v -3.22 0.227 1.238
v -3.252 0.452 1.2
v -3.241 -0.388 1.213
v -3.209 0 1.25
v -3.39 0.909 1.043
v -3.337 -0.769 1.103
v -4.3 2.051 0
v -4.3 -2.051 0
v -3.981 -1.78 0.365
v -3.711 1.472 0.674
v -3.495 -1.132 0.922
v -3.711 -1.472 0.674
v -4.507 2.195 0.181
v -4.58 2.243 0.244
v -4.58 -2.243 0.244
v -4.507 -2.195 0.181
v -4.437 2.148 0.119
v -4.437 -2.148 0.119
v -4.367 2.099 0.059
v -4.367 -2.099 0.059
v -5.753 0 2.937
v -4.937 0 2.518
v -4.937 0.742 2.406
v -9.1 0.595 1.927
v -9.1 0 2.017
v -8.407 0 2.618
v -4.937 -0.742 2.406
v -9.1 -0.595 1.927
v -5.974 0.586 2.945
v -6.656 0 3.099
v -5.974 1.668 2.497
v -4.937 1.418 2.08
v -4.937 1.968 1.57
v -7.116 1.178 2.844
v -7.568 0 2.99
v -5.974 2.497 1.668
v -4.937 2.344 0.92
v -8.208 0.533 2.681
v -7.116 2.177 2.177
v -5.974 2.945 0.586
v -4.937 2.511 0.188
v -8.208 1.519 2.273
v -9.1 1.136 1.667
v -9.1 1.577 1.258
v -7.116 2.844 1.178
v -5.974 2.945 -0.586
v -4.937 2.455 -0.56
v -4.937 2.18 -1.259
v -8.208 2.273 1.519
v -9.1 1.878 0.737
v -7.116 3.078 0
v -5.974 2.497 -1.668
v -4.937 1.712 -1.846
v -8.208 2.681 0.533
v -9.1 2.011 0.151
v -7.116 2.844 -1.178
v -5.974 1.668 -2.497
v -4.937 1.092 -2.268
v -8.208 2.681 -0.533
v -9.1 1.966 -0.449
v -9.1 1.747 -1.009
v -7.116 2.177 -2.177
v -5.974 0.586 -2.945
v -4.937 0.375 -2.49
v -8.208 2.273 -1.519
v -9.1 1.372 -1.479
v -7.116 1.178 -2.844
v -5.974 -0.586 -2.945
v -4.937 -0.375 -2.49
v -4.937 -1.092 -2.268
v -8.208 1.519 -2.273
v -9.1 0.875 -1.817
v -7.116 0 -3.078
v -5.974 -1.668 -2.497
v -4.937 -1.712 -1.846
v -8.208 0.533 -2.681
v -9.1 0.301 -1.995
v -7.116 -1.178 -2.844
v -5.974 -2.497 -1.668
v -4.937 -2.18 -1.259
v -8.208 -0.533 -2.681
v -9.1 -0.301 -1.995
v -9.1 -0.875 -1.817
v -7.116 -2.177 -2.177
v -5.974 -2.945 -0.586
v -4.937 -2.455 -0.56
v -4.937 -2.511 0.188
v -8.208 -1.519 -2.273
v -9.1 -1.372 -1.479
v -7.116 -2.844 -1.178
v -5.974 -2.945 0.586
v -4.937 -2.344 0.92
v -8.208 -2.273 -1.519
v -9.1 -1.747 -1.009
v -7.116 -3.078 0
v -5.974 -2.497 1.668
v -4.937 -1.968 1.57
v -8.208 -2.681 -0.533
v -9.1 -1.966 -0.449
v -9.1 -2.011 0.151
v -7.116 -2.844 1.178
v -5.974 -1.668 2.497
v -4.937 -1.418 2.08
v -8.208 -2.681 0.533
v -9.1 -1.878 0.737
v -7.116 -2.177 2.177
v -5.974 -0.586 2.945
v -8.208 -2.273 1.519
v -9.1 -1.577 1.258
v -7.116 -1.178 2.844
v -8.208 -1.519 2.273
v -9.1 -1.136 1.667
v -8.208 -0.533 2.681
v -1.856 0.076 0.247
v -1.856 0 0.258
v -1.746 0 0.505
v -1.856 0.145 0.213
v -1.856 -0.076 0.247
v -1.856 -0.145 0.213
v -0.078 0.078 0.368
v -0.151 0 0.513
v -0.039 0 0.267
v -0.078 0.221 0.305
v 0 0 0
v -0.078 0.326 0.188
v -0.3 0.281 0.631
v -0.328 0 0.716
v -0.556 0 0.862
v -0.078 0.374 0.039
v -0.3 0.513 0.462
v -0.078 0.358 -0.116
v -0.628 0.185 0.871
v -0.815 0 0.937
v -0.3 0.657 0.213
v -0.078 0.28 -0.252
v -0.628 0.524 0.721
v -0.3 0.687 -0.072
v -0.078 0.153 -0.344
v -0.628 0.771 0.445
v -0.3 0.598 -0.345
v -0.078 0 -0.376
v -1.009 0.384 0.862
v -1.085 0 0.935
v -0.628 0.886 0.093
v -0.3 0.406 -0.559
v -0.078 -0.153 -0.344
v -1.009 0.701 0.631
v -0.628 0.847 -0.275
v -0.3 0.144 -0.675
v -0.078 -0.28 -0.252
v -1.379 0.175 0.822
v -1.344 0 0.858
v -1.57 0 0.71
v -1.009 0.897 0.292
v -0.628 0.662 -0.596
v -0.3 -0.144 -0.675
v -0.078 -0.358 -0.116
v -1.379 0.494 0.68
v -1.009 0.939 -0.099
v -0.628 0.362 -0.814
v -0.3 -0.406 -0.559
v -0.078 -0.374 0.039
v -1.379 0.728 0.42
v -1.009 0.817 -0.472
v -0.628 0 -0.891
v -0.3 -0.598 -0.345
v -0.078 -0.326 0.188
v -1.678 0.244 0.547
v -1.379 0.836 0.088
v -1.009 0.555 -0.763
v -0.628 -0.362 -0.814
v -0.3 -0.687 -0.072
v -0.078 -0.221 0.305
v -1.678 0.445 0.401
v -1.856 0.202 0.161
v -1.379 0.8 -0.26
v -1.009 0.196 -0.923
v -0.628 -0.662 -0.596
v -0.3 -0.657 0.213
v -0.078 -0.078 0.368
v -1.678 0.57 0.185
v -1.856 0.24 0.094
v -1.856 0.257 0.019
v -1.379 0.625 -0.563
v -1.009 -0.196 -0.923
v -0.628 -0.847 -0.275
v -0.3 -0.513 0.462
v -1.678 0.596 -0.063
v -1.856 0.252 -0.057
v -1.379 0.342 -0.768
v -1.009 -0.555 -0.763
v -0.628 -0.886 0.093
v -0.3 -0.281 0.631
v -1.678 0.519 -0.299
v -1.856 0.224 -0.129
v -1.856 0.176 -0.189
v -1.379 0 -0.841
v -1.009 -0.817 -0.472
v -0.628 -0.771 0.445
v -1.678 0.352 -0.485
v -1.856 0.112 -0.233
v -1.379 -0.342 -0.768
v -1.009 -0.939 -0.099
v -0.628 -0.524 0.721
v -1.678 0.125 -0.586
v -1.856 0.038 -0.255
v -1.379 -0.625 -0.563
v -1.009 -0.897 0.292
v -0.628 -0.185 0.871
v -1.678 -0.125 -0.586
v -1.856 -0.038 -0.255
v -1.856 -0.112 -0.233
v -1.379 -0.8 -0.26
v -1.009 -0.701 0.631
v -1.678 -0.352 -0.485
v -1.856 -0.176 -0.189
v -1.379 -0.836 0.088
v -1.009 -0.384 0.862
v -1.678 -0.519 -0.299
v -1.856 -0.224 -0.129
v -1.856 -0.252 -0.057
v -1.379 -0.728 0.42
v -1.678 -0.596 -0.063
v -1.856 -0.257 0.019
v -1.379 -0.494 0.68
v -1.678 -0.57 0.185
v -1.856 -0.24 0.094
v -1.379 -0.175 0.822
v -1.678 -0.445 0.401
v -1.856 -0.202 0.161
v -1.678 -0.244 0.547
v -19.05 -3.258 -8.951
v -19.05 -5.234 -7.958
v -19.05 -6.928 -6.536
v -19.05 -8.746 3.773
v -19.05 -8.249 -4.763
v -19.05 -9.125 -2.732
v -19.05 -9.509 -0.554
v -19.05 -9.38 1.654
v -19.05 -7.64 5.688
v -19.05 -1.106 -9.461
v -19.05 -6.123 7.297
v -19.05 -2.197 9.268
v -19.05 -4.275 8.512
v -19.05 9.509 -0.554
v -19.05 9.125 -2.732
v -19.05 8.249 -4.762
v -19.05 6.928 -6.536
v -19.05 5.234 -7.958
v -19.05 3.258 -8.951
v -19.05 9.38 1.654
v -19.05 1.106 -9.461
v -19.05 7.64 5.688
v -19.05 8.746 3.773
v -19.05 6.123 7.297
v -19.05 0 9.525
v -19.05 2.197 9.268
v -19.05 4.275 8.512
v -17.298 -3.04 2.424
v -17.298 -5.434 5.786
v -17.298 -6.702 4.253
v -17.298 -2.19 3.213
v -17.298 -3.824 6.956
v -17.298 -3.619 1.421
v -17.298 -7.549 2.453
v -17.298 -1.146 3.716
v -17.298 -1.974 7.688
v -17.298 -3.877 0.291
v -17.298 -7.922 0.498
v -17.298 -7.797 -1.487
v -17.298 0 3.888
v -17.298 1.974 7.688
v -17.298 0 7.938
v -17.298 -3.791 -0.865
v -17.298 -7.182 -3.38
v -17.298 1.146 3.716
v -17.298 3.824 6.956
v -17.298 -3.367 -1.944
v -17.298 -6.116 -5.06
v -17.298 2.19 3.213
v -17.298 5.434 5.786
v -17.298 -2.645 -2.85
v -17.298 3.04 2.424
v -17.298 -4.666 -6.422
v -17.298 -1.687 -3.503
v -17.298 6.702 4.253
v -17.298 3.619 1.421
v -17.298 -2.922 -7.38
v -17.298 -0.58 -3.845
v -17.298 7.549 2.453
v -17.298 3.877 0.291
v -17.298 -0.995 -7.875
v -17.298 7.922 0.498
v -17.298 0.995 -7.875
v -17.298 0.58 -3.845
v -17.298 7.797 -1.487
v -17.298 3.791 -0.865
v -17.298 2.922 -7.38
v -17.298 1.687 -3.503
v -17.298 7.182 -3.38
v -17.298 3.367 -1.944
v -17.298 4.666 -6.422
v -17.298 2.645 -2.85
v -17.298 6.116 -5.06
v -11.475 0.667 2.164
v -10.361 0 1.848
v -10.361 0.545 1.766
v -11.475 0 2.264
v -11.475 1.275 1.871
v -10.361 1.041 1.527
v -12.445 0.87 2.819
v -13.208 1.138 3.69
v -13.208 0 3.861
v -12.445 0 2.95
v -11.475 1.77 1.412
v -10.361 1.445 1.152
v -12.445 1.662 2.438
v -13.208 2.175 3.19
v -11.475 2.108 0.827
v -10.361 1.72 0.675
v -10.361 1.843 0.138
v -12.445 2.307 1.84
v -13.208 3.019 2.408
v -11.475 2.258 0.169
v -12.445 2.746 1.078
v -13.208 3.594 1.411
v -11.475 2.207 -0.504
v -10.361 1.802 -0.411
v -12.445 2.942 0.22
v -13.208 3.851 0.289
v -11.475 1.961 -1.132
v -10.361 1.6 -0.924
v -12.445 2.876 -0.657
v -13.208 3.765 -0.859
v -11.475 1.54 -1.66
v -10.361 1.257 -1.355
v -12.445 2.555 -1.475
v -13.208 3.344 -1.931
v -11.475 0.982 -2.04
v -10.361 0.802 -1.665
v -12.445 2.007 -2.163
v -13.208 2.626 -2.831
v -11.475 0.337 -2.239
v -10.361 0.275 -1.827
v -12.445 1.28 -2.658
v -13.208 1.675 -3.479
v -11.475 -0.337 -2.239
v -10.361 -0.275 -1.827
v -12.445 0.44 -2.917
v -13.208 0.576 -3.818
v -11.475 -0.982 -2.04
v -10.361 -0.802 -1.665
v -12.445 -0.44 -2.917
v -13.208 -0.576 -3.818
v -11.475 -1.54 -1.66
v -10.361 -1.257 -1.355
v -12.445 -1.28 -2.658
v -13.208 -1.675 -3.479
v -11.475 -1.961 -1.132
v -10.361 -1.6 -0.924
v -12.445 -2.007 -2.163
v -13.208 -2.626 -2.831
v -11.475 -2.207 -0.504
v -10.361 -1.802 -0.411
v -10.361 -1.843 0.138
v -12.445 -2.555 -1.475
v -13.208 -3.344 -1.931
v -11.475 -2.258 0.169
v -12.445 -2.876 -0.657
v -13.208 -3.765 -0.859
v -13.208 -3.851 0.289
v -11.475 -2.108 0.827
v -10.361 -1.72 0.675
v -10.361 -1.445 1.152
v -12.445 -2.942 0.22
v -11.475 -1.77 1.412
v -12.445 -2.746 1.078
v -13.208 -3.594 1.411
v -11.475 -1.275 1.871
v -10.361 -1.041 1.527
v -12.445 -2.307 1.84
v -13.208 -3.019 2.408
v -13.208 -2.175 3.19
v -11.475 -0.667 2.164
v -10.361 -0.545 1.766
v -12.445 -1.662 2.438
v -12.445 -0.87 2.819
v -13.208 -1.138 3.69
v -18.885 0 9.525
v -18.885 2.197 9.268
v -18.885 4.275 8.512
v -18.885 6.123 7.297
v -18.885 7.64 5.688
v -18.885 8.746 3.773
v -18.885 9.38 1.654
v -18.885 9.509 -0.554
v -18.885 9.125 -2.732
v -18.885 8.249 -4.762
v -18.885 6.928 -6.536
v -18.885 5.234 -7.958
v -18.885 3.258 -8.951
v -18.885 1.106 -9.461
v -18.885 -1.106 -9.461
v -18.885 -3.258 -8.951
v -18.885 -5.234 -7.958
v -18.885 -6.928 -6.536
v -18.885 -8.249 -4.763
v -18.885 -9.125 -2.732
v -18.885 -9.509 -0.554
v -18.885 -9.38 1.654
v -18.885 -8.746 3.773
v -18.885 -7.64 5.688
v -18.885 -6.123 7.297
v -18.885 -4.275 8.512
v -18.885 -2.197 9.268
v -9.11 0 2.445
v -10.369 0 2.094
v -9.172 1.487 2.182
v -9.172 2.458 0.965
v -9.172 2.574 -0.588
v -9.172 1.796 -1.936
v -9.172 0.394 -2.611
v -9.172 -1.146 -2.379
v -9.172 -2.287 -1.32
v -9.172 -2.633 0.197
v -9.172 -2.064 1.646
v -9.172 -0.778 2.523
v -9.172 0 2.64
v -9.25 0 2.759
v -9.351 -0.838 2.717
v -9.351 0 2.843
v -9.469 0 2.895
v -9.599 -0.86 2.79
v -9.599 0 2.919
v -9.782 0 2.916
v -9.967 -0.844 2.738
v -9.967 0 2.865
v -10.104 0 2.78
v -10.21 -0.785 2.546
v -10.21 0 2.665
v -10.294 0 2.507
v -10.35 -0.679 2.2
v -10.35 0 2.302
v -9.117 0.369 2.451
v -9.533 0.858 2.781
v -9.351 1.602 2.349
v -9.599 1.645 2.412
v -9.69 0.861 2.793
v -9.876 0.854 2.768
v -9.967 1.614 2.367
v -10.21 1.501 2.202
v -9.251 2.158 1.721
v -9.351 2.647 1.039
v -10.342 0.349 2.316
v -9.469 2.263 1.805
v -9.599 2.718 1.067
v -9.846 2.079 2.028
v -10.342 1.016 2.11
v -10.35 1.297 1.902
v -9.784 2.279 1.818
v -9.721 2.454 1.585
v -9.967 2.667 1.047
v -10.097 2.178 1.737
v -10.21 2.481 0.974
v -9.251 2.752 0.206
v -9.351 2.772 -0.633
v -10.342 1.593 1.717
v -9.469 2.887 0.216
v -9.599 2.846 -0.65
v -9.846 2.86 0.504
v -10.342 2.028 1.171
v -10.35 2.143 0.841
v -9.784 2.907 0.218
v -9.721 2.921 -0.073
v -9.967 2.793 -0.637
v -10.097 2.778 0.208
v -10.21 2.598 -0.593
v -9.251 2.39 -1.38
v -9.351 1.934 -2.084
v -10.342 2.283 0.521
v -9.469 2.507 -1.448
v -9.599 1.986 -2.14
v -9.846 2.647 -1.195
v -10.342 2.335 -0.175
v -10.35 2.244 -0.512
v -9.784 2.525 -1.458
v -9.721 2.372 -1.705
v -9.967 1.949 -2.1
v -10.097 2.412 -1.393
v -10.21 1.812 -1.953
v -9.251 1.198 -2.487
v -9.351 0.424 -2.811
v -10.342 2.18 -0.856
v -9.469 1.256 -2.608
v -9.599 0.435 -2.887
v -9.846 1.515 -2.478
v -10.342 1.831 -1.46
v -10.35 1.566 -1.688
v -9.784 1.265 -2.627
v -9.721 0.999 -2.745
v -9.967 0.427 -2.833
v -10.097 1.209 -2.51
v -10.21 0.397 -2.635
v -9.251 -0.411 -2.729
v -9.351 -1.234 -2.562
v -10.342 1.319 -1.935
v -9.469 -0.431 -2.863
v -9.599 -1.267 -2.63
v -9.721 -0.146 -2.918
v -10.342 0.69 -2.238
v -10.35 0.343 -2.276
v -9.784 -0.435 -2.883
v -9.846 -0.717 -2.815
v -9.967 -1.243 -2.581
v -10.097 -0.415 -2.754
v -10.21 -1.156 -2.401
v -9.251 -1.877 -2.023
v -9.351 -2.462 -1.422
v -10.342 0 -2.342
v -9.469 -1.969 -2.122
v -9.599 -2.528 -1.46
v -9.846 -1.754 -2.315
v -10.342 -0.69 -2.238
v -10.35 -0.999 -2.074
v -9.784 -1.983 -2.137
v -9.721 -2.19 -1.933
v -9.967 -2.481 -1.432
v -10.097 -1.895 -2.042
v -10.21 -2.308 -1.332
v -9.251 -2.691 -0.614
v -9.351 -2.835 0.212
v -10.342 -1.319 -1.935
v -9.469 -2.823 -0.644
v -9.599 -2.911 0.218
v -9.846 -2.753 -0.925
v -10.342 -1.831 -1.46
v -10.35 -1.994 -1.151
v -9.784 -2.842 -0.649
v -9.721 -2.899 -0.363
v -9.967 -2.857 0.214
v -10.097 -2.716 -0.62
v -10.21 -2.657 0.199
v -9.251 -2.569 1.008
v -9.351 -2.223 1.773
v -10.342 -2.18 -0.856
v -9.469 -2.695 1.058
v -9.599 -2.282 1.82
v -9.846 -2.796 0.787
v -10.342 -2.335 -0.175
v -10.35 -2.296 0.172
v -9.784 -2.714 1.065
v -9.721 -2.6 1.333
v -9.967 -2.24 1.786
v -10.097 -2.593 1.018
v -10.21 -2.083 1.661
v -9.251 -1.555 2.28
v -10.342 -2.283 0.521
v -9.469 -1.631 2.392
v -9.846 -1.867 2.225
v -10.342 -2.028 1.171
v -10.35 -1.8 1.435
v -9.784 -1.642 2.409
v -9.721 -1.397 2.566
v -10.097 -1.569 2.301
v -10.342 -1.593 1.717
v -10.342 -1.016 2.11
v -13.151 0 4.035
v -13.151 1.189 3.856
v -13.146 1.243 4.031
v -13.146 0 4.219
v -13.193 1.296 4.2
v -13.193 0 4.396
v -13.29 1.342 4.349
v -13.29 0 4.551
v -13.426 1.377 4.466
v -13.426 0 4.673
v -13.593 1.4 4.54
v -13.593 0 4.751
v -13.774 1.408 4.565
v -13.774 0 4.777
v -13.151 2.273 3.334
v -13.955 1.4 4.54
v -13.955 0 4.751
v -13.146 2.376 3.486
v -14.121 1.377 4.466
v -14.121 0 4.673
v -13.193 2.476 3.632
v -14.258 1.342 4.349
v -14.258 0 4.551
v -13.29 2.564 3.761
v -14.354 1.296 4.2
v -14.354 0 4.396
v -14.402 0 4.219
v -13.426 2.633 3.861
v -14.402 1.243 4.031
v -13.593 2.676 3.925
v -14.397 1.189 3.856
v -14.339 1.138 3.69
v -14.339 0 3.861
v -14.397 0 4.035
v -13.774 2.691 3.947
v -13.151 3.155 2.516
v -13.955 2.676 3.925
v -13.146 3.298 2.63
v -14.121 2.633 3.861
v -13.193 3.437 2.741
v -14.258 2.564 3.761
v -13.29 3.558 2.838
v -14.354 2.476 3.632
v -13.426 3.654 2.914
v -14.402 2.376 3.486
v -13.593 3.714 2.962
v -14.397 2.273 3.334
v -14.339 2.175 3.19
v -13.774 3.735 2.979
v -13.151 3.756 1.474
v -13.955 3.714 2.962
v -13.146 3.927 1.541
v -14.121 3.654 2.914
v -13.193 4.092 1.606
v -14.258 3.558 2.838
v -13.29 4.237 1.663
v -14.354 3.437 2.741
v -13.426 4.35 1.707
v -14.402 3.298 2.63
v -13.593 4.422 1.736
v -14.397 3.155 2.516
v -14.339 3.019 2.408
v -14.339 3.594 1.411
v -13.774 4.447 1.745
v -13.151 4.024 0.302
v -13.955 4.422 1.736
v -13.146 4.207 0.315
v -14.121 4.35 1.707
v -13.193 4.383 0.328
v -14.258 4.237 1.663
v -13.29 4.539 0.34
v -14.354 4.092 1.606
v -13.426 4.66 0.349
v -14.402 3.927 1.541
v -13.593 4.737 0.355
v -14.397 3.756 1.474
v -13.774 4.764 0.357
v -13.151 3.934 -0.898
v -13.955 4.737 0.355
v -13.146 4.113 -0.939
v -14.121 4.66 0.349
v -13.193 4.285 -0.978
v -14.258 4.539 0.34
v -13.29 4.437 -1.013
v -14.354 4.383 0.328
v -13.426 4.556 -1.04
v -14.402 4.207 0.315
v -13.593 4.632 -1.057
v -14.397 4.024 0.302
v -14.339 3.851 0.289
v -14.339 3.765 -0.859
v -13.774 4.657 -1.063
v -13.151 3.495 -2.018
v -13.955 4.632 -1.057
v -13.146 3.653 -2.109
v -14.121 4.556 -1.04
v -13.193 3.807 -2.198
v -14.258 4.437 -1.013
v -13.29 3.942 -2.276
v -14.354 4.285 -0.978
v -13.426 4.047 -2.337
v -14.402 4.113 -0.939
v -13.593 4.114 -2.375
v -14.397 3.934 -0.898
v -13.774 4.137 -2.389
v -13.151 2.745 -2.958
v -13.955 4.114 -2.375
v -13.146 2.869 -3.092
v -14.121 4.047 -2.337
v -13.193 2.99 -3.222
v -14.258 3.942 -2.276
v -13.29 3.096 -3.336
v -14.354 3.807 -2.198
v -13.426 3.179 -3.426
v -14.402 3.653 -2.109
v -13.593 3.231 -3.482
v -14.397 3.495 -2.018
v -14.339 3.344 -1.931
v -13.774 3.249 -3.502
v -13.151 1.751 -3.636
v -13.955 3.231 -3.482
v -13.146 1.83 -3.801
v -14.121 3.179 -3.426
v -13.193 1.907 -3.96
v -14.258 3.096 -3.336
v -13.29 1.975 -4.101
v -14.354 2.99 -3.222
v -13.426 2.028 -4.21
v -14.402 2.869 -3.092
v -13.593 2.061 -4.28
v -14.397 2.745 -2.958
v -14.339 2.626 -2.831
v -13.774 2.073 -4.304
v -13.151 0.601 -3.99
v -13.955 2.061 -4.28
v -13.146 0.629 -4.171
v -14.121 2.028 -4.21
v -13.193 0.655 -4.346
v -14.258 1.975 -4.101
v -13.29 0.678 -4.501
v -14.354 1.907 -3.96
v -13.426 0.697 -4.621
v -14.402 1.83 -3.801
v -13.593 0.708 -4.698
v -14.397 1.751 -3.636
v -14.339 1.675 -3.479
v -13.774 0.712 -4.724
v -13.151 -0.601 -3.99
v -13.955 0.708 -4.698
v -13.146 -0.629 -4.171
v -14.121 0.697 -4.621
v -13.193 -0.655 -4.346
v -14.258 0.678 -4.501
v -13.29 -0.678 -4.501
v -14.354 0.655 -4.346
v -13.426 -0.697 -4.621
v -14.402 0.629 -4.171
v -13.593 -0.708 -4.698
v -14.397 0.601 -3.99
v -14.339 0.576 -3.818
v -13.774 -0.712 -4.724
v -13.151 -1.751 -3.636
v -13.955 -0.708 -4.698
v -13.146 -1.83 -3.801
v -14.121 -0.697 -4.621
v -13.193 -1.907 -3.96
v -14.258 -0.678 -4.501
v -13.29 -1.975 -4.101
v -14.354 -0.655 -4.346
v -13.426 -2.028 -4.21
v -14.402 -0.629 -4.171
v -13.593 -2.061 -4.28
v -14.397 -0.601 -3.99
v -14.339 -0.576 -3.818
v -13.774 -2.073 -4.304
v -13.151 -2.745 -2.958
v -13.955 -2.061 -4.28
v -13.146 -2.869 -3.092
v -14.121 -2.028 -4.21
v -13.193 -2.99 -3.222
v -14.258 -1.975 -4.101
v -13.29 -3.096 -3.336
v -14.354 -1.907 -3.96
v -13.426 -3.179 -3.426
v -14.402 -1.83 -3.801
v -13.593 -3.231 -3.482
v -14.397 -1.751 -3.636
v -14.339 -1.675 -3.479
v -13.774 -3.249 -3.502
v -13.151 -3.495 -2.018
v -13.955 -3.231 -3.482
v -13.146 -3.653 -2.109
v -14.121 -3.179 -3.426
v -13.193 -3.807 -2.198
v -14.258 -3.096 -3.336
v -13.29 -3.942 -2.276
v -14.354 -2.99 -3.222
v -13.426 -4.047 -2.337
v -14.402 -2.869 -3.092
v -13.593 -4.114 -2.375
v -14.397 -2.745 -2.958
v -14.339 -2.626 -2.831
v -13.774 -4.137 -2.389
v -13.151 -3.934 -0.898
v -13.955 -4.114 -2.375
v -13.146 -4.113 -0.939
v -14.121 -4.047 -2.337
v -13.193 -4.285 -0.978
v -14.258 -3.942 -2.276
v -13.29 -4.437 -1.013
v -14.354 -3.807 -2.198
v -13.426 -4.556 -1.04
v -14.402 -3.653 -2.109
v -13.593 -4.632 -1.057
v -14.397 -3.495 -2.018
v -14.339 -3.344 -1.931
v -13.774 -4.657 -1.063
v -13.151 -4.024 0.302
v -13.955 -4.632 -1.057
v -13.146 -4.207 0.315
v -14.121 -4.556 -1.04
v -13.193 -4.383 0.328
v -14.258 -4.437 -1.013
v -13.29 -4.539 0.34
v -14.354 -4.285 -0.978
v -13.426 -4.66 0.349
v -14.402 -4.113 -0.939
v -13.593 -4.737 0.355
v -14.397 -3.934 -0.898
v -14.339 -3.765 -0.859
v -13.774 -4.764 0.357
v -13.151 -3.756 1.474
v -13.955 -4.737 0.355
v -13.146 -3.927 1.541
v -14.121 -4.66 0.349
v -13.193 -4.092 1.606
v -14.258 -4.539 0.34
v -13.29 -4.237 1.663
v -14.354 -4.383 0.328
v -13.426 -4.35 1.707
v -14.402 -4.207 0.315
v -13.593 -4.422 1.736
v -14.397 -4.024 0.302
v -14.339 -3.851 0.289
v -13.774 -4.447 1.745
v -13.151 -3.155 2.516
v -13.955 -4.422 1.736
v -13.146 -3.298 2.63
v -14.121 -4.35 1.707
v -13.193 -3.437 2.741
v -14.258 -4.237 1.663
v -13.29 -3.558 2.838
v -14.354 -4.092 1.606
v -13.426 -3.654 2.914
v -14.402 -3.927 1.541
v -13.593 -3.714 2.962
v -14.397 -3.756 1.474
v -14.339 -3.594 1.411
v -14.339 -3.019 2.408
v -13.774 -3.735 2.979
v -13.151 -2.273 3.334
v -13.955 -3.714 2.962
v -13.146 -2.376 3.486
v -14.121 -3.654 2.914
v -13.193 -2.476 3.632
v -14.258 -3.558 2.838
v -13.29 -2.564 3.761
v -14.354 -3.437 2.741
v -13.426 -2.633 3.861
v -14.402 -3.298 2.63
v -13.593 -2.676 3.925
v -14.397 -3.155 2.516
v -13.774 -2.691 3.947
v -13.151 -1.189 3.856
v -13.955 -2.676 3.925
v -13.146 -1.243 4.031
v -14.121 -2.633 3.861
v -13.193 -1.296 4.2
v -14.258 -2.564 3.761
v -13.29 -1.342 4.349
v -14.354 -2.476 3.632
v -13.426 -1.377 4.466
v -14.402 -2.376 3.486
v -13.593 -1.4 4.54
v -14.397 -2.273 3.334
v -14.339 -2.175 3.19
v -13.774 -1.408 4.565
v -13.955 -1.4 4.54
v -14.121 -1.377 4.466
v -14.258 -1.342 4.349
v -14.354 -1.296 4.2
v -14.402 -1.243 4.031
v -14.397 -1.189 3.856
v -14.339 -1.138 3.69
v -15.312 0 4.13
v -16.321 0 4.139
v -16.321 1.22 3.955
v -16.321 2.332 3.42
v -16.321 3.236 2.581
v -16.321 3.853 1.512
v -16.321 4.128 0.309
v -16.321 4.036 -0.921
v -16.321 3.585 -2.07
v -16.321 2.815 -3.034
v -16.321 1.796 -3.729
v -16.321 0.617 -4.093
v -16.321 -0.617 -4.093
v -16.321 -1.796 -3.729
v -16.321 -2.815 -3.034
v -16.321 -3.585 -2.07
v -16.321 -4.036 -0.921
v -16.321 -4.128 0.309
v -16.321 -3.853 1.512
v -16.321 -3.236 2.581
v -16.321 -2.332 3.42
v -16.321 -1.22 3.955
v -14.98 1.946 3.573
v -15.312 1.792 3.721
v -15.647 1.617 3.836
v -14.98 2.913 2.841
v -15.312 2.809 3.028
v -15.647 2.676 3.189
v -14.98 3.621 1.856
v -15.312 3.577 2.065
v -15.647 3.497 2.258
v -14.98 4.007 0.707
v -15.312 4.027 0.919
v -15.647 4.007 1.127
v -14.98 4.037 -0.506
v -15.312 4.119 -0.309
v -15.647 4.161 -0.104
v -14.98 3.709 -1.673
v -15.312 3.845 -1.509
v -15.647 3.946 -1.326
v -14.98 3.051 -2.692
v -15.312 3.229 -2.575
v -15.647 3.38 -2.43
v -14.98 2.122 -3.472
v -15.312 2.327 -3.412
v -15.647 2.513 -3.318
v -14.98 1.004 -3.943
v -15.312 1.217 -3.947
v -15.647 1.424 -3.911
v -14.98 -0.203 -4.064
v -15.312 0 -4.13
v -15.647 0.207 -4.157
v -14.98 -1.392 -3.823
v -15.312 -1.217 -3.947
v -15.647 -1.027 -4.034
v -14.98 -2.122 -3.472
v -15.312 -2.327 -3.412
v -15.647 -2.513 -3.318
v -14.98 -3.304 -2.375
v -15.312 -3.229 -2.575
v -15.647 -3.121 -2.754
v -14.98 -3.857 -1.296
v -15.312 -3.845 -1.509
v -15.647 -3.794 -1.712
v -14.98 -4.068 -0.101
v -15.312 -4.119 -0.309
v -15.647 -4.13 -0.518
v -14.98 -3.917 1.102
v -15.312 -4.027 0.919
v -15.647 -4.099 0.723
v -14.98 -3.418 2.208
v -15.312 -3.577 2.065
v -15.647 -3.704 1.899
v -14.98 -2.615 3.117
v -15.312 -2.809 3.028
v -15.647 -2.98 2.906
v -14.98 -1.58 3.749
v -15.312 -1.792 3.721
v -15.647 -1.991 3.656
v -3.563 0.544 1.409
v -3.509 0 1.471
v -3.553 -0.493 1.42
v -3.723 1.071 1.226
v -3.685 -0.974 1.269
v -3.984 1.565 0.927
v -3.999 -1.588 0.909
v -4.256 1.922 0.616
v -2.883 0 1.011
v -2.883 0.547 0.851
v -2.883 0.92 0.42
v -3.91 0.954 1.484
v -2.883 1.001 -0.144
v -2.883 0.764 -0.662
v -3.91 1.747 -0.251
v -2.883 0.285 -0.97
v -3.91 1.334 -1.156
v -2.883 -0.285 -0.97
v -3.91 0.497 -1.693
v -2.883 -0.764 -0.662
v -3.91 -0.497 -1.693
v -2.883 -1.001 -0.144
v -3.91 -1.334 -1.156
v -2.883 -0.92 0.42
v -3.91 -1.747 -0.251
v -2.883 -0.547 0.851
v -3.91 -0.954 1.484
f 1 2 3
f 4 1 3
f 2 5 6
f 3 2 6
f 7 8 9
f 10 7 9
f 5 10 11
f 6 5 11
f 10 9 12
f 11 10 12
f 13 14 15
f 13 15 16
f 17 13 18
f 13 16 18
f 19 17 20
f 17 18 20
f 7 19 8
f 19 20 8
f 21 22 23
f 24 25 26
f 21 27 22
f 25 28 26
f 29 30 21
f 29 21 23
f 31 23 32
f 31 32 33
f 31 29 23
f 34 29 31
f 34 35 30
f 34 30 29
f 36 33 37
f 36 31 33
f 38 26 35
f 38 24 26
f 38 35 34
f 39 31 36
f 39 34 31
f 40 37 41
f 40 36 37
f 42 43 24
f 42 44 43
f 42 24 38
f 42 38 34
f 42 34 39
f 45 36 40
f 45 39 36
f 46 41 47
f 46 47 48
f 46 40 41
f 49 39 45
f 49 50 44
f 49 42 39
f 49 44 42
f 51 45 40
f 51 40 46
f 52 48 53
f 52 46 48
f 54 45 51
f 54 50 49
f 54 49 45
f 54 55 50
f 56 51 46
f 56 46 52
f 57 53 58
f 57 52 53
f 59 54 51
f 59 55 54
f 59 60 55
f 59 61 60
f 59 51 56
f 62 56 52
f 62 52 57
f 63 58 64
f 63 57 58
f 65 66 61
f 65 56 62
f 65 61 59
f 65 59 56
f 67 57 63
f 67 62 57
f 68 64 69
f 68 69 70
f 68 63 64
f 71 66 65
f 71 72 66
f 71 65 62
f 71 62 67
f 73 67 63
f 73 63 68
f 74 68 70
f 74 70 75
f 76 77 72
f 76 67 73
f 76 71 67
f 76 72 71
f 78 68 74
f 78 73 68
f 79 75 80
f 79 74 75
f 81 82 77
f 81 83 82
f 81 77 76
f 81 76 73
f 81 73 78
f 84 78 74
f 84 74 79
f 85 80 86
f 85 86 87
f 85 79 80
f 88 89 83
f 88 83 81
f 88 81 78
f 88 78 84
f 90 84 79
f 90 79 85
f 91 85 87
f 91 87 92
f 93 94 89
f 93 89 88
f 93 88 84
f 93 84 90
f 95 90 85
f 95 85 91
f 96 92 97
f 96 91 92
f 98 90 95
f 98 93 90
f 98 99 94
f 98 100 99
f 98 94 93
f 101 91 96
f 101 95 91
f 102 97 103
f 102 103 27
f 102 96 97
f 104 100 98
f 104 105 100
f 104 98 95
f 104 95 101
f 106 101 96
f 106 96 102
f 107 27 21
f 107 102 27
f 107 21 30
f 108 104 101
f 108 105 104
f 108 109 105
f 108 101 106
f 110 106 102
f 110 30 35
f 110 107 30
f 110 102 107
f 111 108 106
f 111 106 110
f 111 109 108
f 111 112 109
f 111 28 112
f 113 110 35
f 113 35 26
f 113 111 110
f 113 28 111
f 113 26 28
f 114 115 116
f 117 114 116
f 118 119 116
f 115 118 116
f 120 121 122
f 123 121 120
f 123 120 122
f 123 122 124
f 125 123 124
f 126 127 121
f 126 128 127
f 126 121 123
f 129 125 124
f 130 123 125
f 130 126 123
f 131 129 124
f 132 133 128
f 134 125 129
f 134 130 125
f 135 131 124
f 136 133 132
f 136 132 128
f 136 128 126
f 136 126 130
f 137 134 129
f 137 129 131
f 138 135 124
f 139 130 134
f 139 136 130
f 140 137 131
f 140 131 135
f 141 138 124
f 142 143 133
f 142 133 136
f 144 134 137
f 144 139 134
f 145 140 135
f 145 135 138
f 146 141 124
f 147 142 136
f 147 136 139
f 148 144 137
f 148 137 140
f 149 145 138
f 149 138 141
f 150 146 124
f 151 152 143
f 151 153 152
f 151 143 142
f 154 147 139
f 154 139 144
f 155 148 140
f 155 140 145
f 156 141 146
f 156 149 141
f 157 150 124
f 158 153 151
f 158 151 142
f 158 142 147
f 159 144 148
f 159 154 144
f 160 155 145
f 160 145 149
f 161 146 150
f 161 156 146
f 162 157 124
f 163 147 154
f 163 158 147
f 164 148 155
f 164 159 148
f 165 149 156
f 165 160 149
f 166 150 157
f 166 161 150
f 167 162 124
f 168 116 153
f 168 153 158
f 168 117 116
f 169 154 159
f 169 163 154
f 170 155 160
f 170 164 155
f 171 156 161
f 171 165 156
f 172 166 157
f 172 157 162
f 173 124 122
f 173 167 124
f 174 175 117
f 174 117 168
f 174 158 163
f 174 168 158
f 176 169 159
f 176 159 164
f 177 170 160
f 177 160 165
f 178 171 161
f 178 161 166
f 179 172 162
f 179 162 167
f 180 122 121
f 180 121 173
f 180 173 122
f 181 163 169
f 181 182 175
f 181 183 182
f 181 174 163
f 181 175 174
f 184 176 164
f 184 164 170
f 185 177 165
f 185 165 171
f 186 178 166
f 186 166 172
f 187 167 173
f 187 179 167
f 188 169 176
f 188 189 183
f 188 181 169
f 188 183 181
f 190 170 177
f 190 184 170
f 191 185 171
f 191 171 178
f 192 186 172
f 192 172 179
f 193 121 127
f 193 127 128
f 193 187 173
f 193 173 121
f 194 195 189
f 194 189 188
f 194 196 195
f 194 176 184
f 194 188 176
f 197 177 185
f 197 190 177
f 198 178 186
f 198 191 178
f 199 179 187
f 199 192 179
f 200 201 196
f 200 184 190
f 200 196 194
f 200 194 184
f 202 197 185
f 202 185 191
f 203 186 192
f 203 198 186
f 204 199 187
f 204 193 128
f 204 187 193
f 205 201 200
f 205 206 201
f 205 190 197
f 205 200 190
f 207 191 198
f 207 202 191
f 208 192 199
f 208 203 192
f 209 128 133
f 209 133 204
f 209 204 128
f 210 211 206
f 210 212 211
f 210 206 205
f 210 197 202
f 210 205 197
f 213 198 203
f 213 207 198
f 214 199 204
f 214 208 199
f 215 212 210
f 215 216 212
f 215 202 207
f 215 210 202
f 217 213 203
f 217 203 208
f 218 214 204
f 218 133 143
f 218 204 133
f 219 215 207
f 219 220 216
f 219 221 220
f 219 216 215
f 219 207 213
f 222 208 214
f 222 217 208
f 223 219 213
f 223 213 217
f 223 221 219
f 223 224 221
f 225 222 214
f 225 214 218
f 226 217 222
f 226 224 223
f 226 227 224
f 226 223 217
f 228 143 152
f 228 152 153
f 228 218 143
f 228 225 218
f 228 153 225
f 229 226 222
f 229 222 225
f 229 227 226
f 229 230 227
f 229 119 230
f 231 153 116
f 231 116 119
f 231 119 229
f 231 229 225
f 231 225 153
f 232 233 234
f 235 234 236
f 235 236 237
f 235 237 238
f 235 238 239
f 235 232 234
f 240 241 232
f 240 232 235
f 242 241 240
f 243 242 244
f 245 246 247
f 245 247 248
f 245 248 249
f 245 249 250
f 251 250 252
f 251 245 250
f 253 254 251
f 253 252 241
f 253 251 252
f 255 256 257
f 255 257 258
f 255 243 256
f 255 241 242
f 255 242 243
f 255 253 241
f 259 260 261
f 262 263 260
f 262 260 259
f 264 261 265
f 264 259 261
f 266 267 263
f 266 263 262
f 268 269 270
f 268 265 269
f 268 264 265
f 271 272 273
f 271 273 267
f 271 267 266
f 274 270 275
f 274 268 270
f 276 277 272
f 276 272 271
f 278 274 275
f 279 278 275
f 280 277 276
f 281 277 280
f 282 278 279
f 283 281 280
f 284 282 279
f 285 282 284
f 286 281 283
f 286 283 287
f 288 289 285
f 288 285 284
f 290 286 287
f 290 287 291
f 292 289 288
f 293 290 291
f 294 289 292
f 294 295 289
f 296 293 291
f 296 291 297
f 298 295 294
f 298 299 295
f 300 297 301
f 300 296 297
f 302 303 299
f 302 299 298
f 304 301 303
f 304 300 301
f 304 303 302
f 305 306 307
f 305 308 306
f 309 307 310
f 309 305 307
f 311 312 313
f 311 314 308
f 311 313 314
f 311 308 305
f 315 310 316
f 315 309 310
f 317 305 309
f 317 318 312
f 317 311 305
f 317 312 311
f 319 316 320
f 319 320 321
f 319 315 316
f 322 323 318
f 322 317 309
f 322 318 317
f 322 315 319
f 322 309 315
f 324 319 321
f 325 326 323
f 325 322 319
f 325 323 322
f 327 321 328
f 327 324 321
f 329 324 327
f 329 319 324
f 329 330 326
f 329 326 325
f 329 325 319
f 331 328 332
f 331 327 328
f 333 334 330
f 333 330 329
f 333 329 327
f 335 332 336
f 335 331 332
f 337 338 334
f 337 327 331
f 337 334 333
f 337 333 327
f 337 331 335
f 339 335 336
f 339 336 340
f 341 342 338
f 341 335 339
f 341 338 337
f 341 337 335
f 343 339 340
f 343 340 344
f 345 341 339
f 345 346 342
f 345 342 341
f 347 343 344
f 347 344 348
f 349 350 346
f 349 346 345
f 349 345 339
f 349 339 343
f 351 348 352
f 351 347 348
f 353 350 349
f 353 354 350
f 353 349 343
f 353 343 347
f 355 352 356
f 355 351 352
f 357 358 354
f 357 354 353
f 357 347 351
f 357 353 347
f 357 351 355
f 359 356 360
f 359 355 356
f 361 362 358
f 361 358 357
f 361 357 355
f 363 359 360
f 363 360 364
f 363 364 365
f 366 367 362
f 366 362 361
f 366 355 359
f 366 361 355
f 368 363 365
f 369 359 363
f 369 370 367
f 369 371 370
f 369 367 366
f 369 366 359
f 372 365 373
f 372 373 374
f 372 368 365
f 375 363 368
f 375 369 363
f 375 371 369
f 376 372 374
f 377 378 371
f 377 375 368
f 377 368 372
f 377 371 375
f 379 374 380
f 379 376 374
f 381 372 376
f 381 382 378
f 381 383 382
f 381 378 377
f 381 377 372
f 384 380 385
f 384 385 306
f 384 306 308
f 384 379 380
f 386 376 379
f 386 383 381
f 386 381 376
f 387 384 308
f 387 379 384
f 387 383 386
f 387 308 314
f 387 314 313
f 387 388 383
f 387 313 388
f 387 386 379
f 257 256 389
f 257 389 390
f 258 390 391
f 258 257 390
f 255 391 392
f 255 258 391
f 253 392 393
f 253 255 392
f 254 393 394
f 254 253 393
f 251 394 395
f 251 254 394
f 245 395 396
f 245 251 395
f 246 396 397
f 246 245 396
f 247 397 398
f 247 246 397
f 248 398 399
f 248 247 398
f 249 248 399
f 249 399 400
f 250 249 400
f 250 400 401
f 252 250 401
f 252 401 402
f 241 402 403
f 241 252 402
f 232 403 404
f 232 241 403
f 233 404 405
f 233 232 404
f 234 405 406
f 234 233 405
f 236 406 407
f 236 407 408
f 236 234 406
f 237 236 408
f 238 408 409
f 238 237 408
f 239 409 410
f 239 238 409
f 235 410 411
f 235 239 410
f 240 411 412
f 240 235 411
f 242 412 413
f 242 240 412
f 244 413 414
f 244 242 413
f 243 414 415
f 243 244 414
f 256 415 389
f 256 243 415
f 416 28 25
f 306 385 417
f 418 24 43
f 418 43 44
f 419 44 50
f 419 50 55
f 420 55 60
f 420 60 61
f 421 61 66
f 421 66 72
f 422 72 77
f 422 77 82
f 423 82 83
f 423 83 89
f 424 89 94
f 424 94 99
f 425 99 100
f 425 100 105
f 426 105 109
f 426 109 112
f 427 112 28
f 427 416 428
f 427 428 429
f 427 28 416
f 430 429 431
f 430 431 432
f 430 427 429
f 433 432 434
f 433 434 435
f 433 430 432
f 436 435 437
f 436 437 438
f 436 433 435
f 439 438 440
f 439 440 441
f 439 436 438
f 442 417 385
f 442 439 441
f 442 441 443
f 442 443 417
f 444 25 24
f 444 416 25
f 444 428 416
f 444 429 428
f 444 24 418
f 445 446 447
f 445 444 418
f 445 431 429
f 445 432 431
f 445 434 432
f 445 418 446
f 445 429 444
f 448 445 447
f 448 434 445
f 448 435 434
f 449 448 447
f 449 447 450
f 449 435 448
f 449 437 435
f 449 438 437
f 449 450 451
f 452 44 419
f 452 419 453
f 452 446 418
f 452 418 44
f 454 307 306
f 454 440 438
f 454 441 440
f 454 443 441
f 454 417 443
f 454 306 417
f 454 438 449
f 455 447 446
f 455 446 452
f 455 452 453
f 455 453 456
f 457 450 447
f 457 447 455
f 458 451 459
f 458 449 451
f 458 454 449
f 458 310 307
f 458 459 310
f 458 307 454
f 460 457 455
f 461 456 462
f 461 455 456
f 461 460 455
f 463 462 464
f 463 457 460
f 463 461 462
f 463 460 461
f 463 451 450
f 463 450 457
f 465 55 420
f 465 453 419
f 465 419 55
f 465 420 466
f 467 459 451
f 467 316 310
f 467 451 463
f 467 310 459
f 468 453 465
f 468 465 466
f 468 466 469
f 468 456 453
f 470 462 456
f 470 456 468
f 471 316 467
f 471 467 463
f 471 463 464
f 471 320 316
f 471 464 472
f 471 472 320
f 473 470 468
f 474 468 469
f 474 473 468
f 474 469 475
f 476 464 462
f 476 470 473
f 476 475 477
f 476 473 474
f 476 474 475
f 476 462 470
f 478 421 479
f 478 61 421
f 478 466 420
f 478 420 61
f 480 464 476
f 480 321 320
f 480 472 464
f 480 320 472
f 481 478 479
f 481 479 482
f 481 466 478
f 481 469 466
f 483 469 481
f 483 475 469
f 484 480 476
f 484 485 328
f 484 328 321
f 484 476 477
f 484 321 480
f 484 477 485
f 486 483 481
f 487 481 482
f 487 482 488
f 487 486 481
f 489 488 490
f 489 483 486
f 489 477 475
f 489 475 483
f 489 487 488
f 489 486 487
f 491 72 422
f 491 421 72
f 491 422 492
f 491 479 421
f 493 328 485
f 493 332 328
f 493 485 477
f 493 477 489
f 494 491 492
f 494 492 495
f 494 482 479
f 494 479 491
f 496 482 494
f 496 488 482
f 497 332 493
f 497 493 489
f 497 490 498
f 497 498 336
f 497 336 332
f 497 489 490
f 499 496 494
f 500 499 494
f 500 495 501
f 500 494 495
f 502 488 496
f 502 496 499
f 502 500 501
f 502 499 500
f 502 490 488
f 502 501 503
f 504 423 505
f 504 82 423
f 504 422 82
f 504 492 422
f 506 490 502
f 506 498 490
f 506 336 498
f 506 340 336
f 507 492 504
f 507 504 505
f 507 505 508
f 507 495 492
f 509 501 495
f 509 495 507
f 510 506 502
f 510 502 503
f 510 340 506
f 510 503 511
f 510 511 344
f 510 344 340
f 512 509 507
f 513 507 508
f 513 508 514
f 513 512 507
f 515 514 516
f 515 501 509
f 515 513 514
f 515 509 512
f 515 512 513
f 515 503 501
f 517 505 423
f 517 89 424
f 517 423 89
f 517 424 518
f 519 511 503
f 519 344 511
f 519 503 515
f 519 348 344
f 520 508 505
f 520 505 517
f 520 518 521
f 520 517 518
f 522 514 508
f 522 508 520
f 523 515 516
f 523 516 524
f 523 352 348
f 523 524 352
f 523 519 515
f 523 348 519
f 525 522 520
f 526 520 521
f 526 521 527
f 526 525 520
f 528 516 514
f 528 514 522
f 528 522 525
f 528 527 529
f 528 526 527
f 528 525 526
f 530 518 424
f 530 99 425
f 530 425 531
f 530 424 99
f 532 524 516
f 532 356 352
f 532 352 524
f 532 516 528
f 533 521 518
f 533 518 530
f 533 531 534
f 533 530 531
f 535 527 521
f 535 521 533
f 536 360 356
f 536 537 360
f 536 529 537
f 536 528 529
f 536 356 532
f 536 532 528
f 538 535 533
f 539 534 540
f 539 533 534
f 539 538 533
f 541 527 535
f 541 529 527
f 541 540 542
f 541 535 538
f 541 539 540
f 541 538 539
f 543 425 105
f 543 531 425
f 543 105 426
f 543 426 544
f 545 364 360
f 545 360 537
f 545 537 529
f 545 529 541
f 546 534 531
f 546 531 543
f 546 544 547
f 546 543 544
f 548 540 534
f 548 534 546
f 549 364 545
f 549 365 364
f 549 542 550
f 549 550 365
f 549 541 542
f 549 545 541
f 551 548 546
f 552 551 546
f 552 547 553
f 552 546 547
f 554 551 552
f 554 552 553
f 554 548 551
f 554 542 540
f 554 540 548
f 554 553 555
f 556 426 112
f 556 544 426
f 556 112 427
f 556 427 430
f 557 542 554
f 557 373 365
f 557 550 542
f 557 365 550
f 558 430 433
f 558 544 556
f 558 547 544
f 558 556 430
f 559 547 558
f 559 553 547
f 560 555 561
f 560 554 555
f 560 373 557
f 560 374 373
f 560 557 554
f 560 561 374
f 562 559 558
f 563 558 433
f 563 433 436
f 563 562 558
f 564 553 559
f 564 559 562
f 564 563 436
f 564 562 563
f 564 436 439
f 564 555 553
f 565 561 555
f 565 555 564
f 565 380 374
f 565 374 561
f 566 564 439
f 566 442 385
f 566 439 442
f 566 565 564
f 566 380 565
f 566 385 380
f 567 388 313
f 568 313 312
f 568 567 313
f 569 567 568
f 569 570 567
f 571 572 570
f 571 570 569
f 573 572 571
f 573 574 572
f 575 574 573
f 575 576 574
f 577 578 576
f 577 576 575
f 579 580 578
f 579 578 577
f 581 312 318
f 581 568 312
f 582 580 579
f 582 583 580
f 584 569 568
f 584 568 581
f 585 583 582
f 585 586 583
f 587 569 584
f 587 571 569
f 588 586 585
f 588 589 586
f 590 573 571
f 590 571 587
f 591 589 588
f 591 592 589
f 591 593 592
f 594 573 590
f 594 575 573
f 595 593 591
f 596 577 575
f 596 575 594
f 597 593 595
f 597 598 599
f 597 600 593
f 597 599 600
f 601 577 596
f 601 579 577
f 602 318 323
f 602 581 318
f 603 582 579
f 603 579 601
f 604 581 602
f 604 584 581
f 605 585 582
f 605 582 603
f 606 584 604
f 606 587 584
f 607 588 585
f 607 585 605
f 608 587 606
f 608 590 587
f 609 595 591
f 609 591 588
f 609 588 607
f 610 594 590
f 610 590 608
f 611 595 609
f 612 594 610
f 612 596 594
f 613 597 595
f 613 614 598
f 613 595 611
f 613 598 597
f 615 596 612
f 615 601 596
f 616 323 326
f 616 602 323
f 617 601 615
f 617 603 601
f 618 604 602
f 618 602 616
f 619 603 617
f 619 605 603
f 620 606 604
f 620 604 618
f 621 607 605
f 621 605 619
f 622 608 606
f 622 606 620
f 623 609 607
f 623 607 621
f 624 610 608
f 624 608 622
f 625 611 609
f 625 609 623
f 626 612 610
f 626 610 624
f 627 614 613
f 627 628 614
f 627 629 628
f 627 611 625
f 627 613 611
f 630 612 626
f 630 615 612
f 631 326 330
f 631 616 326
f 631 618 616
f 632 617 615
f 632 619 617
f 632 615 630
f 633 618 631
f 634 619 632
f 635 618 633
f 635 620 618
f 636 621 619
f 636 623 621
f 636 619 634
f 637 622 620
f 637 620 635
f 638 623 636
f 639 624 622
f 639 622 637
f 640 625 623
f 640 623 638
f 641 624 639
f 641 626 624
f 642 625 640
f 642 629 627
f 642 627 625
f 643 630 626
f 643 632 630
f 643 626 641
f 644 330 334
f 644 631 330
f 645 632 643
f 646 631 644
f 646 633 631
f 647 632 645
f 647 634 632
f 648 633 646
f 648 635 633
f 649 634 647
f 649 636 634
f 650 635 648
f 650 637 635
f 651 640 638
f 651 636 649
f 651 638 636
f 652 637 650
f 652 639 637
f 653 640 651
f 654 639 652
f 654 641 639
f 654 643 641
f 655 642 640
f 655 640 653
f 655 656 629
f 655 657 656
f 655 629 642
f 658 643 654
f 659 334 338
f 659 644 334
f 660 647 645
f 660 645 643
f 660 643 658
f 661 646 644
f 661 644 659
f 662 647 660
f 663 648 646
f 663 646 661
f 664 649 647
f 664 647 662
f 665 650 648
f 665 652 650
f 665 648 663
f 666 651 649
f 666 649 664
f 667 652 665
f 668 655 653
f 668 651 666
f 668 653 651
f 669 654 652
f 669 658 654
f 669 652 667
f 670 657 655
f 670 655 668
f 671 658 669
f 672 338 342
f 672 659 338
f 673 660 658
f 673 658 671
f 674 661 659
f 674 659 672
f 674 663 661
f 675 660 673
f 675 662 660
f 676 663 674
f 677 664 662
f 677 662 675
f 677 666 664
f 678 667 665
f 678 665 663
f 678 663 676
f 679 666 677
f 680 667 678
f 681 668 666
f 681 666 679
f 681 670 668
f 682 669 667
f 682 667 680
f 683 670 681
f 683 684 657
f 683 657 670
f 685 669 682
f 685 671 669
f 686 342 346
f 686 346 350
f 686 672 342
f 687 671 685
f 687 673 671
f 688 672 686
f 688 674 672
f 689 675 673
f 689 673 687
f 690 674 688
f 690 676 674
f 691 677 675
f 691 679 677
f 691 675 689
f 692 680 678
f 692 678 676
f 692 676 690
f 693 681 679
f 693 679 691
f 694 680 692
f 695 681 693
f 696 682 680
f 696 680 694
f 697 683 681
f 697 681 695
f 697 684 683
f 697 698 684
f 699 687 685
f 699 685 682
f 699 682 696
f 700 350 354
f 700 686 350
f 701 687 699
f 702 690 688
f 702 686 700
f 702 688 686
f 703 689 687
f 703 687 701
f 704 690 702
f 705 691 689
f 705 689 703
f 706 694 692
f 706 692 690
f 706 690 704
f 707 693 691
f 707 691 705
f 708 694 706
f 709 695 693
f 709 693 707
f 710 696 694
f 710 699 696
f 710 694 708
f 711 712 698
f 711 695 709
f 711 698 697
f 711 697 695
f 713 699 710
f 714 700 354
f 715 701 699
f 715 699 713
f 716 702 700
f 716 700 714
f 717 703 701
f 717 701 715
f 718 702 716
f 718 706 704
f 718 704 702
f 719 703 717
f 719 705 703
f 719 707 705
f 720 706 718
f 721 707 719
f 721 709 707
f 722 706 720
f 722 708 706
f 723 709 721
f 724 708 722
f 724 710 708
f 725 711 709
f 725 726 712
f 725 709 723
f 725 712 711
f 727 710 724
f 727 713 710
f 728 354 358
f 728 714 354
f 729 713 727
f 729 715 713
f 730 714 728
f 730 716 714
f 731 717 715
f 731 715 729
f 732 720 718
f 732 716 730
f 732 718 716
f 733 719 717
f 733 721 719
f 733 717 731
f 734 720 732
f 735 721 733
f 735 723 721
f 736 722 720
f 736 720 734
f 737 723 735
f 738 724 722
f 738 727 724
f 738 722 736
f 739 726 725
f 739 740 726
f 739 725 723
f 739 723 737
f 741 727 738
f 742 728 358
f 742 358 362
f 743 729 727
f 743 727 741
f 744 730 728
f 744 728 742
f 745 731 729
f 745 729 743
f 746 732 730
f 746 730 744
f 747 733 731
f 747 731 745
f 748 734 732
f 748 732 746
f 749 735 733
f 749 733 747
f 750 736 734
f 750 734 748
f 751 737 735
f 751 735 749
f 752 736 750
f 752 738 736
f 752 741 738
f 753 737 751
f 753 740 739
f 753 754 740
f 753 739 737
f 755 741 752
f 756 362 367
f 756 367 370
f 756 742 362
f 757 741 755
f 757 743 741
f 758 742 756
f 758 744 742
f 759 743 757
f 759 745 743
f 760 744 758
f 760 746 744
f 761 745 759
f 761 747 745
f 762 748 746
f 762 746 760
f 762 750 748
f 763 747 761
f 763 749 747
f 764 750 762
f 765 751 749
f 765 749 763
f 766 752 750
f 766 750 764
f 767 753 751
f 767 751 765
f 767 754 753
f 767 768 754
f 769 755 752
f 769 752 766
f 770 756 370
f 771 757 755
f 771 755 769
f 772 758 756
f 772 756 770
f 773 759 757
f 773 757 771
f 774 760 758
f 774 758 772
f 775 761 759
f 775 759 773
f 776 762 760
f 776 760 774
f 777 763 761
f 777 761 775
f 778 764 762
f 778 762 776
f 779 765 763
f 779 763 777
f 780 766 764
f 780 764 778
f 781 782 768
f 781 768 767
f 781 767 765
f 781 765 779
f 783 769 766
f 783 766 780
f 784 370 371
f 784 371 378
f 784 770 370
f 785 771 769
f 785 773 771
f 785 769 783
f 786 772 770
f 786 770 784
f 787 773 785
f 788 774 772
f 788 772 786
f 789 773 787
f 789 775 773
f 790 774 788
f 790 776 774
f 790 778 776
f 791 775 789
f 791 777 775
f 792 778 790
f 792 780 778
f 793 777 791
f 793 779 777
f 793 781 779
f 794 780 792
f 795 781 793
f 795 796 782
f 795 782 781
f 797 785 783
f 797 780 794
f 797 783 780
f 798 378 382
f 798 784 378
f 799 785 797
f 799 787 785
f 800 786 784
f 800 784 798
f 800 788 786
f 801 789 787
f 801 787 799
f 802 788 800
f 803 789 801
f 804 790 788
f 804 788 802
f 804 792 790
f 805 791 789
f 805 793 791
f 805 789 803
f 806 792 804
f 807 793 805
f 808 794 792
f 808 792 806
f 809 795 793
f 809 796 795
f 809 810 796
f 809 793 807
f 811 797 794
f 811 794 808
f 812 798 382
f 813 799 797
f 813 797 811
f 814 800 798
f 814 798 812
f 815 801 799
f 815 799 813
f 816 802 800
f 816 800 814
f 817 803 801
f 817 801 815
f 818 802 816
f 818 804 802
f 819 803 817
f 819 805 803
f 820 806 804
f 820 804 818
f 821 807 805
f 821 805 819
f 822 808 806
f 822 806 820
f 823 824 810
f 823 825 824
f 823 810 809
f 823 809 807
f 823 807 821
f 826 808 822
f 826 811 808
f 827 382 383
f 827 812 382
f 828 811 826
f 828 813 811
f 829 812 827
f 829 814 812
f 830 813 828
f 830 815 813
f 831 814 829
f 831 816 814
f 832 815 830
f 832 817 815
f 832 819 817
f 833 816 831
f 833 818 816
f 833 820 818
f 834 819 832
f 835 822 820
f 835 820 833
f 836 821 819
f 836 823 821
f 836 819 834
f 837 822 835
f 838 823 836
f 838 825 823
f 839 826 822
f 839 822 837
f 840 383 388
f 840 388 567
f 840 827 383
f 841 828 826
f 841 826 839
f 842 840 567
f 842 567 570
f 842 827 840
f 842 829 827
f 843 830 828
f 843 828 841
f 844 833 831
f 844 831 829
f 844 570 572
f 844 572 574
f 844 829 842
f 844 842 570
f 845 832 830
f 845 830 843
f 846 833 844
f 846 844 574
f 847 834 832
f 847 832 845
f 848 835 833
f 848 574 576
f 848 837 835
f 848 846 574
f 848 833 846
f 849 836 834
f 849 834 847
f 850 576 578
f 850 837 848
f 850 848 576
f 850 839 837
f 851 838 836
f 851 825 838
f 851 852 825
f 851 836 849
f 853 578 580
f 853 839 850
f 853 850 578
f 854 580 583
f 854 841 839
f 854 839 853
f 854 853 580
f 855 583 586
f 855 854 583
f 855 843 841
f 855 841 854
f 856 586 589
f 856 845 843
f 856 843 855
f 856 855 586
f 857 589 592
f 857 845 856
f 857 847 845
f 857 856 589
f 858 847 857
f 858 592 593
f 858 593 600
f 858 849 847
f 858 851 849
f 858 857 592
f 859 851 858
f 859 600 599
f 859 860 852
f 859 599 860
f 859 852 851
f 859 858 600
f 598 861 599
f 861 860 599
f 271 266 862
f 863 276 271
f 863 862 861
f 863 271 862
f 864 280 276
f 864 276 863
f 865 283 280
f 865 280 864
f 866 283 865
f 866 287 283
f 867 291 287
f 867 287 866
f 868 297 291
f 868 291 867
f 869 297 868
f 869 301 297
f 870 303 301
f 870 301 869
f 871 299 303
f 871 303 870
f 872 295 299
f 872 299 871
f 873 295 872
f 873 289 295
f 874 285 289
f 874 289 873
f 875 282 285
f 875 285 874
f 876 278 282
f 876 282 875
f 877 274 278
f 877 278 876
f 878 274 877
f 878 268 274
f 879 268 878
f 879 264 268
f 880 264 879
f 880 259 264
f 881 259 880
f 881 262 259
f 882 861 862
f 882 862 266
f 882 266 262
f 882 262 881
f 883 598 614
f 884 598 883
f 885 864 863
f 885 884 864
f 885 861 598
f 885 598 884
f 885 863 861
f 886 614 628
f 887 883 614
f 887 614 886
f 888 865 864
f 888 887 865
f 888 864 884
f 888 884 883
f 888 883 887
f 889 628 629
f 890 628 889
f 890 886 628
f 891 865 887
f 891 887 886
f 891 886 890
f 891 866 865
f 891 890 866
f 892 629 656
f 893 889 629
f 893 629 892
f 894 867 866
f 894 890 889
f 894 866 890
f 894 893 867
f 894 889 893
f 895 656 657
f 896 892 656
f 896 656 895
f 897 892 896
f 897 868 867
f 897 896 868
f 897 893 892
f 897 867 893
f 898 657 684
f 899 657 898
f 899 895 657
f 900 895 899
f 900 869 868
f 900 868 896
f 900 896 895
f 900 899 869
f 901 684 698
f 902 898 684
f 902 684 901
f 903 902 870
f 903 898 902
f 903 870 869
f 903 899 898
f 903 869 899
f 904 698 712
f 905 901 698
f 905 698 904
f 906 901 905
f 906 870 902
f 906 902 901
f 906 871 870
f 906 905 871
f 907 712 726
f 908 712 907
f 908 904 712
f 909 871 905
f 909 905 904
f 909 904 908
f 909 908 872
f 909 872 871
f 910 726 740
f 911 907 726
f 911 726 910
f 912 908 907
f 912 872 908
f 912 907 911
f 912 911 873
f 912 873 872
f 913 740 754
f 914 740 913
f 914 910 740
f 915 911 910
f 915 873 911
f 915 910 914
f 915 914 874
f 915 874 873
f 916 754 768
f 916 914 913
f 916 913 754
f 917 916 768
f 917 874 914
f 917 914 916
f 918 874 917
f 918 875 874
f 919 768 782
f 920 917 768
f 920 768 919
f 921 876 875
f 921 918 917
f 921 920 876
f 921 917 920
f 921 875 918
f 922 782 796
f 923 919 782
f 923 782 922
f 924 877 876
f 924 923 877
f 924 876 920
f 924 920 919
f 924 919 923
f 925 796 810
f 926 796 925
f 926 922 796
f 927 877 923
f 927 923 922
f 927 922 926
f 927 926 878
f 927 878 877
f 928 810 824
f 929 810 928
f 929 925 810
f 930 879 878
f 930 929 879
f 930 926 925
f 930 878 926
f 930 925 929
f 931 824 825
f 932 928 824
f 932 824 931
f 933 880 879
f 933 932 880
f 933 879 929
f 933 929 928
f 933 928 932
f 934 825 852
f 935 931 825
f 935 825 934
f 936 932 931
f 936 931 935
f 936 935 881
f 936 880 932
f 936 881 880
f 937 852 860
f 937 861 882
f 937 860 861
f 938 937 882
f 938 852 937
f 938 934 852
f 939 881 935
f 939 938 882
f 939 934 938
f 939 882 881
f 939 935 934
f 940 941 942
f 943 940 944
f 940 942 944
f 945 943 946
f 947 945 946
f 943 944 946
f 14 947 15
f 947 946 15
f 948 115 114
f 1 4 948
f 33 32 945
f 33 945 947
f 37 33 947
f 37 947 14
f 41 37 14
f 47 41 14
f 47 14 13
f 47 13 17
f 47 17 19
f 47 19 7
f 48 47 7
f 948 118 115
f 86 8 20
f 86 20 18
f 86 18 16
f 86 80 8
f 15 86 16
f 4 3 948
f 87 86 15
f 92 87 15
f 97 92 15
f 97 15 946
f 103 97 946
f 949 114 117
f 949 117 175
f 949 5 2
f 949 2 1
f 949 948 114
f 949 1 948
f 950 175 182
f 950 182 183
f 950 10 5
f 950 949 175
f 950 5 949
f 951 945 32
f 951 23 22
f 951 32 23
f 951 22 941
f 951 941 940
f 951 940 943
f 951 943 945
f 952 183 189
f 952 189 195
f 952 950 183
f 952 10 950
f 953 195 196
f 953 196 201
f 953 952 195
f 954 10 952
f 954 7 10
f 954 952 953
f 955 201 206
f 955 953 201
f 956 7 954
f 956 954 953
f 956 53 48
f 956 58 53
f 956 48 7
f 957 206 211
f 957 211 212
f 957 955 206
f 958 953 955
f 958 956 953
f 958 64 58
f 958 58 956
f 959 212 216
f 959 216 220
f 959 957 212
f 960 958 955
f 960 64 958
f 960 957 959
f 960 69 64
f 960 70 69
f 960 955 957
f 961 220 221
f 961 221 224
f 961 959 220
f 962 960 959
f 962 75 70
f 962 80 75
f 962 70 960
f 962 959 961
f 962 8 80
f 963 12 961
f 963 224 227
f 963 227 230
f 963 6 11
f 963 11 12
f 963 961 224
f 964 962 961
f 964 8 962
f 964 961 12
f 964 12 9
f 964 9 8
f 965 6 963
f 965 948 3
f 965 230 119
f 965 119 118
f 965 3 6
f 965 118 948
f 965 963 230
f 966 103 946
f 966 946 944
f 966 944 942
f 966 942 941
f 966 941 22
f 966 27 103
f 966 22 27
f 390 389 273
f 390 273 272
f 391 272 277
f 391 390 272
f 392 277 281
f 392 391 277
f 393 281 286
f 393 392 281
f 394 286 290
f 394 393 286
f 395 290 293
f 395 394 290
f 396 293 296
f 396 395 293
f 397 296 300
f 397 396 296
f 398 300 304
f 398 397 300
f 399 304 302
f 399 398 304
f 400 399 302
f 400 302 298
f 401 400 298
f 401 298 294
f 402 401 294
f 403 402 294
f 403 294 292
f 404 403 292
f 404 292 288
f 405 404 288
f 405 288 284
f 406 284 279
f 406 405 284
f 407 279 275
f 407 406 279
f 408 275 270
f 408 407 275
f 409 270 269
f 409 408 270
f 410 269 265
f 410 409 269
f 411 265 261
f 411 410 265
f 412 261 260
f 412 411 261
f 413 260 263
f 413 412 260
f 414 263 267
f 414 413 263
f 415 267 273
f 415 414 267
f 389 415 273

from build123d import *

# Parameters (mm, degrees)
F3_DEPTH = 12.7
F4_SIZE  = 1.5875


with BuildPart() as f1:
    # F0 (on Front) → F1 (revolve)
    with BuildSketch(Plane.XZ):
        with BuildLine():
            Line((-19.05, 0), (0, 0))
            ThreePointArc((0, 0), (-0.8154439902, 0.9367376524), (-1.8556055019, 0.258143252))
            Line((-1.8556055019, 0.258143252), (-4.9366613587, 2.5177319258))
            ThreePointArc((-4.9366613587, 2.5177319258), (-7.1160743184, 3.0782199038), (-9.1004914632, 2.0170525194))
            add(Edge.make_bspline(
                [(-9.1004914632, 2.0170525194), (-9.0348920267, 2.7156813272), (-9.6232644942, 3.1258050353), (-10.4357792433, 2.7243000189), (-10.3614320607, 1.8480558917)],
                knots=[0, 0, 0, 0, 0.4748330346, 1, 1, 1, 1], degree=3))
            ThreePointArc((-10.3614320607, 1.8480558917), (-11.9820298371, 2.5760316776), (-13.2084923798, 3.8613625802))
            ThreePointArc((-13.2084923798, 3.8613625802), (-13.7738747057, 4.7772025554), (-14.3392570317, 3.8613625802))
            ThreePointArc((-14.3392570317, 3.8613625802), (-15.8159361724, 4.1676274604), (-17.2979366034, 3.888245672))
            Line((-17.2979366034, 3.888245672), (-17.2979366034, 9.525))
            Line((-17.2979366034, 9.525), (-19.05, 9.525))
            Line((-19.05, 9.525), (-19.05, 0))
        make_face()
    revolve(axis=Axis((-9.525, 0, 0), (-1, 0, 0)))

    # F2 (on Front) → F3 (cut, symmetric)
    with BuildSketch(Plane.XZ):
        Polygon((-3.0518410046, 1.4299241076), (-3.3710291349, 1.6291189579), (-4.5796369454, 0.2442480844), (-4.299767781, 0), align=None)
    extrude(amount=F3_DEPTH, both=True, mode=Mode.SUBTRACT)

    # F4
    f4_edges = [f1.edges().sort_by_distance(p)[0] for p in [
        (-17.297937, 0, -9.525),
    ]]
    chamfer(f4_edges, length=F4_SIZE)


solid = f1.part
